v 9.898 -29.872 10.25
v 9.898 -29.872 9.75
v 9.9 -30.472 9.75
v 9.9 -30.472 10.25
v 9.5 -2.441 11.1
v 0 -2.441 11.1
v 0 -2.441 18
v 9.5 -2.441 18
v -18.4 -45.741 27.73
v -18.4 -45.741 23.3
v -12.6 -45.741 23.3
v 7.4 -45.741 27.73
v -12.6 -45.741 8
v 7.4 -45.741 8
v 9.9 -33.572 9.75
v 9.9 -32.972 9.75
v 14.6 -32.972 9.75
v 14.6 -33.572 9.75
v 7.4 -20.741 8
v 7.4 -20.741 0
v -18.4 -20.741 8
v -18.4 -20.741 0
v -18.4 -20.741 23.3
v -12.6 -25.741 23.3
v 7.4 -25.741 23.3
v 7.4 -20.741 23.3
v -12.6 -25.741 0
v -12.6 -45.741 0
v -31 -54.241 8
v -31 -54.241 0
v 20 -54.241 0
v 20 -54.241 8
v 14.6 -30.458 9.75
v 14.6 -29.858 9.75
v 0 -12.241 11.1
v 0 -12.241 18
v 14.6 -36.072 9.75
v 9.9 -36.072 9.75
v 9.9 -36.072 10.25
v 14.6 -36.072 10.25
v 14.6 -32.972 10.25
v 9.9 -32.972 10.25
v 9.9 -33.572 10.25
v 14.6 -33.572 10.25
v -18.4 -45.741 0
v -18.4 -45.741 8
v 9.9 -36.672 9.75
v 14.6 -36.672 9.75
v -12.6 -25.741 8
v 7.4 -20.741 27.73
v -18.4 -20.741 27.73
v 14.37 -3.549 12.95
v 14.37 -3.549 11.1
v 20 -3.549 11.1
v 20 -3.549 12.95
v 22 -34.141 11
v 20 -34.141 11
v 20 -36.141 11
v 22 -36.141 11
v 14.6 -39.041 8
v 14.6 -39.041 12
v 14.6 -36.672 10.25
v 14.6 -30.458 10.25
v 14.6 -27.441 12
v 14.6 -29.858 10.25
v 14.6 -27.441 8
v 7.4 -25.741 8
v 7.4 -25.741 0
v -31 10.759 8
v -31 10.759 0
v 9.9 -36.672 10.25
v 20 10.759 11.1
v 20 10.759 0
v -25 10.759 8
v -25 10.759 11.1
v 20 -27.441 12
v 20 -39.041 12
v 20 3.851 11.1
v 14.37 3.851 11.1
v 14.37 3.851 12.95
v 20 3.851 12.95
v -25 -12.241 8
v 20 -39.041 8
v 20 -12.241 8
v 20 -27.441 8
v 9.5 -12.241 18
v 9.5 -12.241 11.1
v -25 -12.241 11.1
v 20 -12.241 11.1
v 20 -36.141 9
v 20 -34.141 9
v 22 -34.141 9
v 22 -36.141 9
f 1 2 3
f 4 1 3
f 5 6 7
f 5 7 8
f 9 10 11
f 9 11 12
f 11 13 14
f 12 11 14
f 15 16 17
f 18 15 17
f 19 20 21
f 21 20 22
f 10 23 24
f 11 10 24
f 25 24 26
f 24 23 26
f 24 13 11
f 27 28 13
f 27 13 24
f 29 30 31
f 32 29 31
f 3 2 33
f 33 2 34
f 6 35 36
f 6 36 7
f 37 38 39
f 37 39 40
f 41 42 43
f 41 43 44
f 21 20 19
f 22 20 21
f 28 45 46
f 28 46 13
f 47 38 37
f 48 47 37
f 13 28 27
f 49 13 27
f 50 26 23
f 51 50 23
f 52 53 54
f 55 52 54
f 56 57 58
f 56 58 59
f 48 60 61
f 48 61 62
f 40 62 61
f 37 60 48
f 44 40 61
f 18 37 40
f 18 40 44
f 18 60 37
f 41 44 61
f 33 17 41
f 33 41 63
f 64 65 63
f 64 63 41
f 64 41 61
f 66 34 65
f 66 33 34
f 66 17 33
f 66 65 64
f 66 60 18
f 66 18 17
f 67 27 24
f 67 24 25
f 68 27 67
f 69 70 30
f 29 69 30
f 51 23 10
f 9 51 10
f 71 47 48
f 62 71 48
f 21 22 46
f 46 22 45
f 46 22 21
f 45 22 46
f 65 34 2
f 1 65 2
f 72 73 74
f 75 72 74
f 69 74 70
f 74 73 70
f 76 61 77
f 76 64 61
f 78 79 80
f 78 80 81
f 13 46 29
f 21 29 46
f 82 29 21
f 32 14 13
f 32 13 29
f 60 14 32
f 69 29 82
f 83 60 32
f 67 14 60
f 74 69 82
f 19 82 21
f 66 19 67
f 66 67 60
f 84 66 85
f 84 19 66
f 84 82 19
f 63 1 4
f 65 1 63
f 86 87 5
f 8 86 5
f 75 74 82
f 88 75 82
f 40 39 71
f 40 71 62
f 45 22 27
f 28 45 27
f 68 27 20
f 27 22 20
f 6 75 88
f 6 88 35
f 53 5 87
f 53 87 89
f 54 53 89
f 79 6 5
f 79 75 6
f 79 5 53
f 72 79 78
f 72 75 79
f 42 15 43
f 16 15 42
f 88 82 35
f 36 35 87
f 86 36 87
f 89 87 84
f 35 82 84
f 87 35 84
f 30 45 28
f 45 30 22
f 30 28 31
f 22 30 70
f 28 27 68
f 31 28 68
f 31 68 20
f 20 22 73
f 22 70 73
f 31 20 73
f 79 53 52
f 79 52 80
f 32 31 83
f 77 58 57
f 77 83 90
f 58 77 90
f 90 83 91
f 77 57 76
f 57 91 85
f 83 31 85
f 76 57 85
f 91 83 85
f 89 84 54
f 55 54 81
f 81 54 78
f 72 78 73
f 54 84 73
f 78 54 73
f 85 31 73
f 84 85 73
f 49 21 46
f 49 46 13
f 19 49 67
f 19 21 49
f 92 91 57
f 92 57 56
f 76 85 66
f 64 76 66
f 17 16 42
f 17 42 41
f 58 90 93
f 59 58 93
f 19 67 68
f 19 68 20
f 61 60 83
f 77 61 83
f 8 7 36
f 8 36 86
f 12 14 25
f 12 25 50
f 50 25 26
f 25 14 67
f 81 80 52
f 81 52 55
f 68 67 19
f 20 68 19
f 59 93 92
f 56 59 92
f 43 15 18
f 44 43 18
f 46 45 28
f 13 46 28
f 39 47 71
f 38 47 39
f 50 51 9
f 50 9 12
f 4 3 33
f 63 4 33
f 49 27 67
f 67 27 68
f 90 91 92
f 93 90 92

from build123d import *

# Parameters (mm, degrees)
F0_W      = 20
F0_H      = 20
F0_W_2    = 9.5
F0_H_2    = 9.8
F0_W_3    = 5.63
F0_H_3    = 7.4
F0_W_4    = 4.7
F0_H_4    = 0.6
F1_DEPTH  = 8
F2_DEPTH  = 11.1
F3_DEPTH  = 12.95
F4_DEPTH  = 18
F5_DEPTH  = 23.3
F6_DEPTH  = 27.73
F7_DEPTH  = 23.3
F8_DEPTH  = 8
F9_DEPTH  = 12
F10_DEPTH = 10.25
F11_DEPTH = 9.75
F12_DEPTH = 8
F0_W_5    = 2
F0_H_5    = 2
F13_DEPTH = 11
F14_DEPTH = 9


with BuildPart() as f1:
    # F0 (on Top) → F1 (new body)
    with BuildSketch(Plane.XY):
        Polygon((-25.000166, 10.759449), (-31.000166, 10.759449), (-31.000166, -54.240551), (19.999834, -54.240551), (19.999834, -39.040551), (14.599834, -39.040551), (14.599834, -36.671682), (9.899834, -36.671682), (9.899834, -36.071682), (14.599834, -36.071682), (14.599834, -33.571682), (9.899834, -33.571682), (9.899834, -32.971682), (14.599834, -32.971682), (14.599834, -30.457526), (9.899834, -30.471682), (9.898027, -29.871685), (14.599834, -29.857523), (14.599834, -27.440551), (19.999834, -27.440551), (19.999834, -12.240551), (9.5, -12.240551), (0, -12.240551), (-25.000166, -12.240551), align=None)
        Polygon((-12.6, -45.740551), (-18.4, -45.740551), (-18.4, -20.740551), (7.4, -20.740551), (7.4, -25.740551), (7.4, -45.740551), align=None, mode=Mode.SUBTRACT)
        with Locations((-2.6, -35.740551)):
            Rectangle(F0_W, F0_H)
        Polygon((-18.4, -20.740551), (-18.4, -45.740551), (-12.6, -45.740551), (-12.6, -25.740551), (7.4, -25.740551), (7.4, -20.740551), align=None)
        Polygon((19.999834, 10.759449), (-25.000166, 10.759449), (-25.000166, -12.240551), (0, -12.240551), (0, -2.440551), (9.5, -2.440551), (9.5, -12.240551), (19.999834, -12.240551), (19.999834, -3.548992), (14.369834, -3.548992), (14.369834, 3.851008), (19.999834, 3.851008), align=None)
        with Locations((4.75, -7.340551)):
            Rectangle(F0_W_2, F0_H_2)
        with Locations((17.184834, 0.151008)):
            Rectangle(F0_W_3, F0_H_3)
        Polygon((14.599834, -39.040551), (19.999834, -39.040551), (19.999834, -36.140551), (19.999834, -34.140551), (19.999834, -27.440551), (14.599834, -27.440551), (14.599834, -29.857523), (14.599834, -30.457526), (14.599834, -32.971682), (14.599834, -33.571682), (14.599834, -36.071682), (14.599834, -36.671682), align=None)
        with Locations((12.249834, -36.371682)):
            Rectangle(F0_W_4, F0_H_4)
        with Locations((12.249834, -33.271682)):
            Rectangle(F0_W_4, F0_H_4)
        Polygon((14.599834, -30.457526), (14.599834, -29.857523), (9.898027, -29.871685), (9.899834, -30.471682), align=None)
    extrude(amount=F1_DEPTH)

    # F0 (on Top) → F2 (join)
    with BuildSketch(Plane.XY):
        Polygon((19.999834, 10.759449), (-25.000166, 10.759449), (-25.000166, -12.240551), (0, -12.240551), (0, -2.440551), (9.5, -2.440551), (9.5, -12.240551), (19.999834, -12.240551), (19.999834, -3.548992), (14.369834, -3.548992), (14.369834, 3.851008), (19.999834, 3.851008), align=None)
        with Locations((4.75, -7.340551)):
            Rectangle(F0_W_2, F0_H_2)
        with Locations((17.184834, 0.151008)):
            Rectangle(F0_W_3, F0_H_3)
    extrude(amount=F2_DEPTH)

    # F0 (on Top) → F3 (join)
    with BuildSketch(Plane.XY):
        with Locations((17.184834, 0.151008)):
            Rectangle(F0_W_3, F0_H_3)
    extrude(amount=F3_DEPTH)

    # F0 (on Top) → F4 (join)
    with BuildSketch(Plane.XY):
        with Locations((4.75, -7.340551)):
            Rectangle(F0_W_2, F0_H_2)
    extrude(amount=F4_DEPTH)

    # F0 (on Top) → F5 (join)
    with BuildSketch(Plane.XY):
        with Locations((-2.6, -35.740551)):
            Rectangle(F0_W, F0_H)
    extrude(amount=F5_DEPTH)

    # F0 (on Top) → F6 (join)
    with BuildSketch(Plane.XY):
        with Locations((-2.6, -35.740551)):
            Rectangle(F0_W, F0_H)
        Polygon((-18.4, -20.740551), (-18.4, -45.740551), (-12.6, -45.740551), (-12.6, -25.740551), (7.4, -25.740551), (7.4, -20.740551), align=None)
    extrude(amount=F6_DEPTH)

    # F0 (on Top) → F7 (cut)
    with BuildSketch(Plane.XY):
        Polygon((-18.4, -20.740551), (-18.4, -45.740551), (-12.6, -45.740551), (-12.6, -25.740551), (7.4, -25.740551), (7.4, -20.740551), align=None)
    extrude(amount=F7_DEPTH, mode=Mode.SUBTRACT)

    # F0 (on Top) → F9 (join)
    with BuildSketch(Plane.XY):
        Polygon((14.599834, -39.040551), (19.999834, -39.040551), (19.999834, -36.140551), (19.999834, -34.140551), (19.999834, -27.440551), (14.599834, -27.440551), (14.599834, -29.857523), (14.599834, -30.457526), (14.599834, -32.971682), (14.599834, -33.571682), (14.599834, -36.071682), (14.599834, -36.671682), align=None)
    extrude(amount=F9_DEPTH)

    # F0 (on Top) → F10 (join)
    with BuildSketch(Plane.XY):
        Polygon((14.599834, -30.457526), (14.599834, -29.857523), (9.898027, -29.871685), (9.899834, -30.471682), align=None)
        with Locations((12.249834, -33.271682)):
            Rectangle(F0_W_4, F0_H_4)
        with Locations((12.249834, -36.371682)):
            Rectangle(F0_W_4, F0_H_4)
    extrude(amount=F10_DEPTH)

    # F0 (on Top) → F11 (cut)
    with BuildSketch(Plane.XY):
        Polygon((14.599834, -30.457526), (14.599834, -29.857523), (9.898027, -29.871685), (9.899834, -30.471682), align=None)
        with Locations((12.249834, -33.271682)):
            Rectangle(F0_W_4, F0_H_4)
        with Locations((12.249834, -36.371682)):
            Rectangle(F0_W_4, F0_H_4)
    extrude(amount=F11_DEPTH, mode=Mode.SUBTRACT)

    # F0 (on Top) → F12 (join)
    with BuildSketch(Plane.XY):
        with Locations((12.249834, -36.371682)):
            Rectangle(F0_W_4, F0_H_4)
        with Locations((12.249834, -33.271682)):
            Rectangle(F0_W_4, F0_H_4)
        Polygon((14.599834, -30.457526), (14.599834, -29.857523), (9.898027, -29.871685), (9.899834, -30.471682), align=None)
    extrude(amount=F12_DEPTH)

    # F0 (on Top) → F13 (join)
    with BuildSketch(Plane.XY):
        with Locations((20.999834, -35.140551)):
            Rectangle(F0_W_5, F0_H_5)
    extrude(amount=F13_DEPTH)

    # F0 (on Top) → F14 (cut)
    with BuildSketch(Plane.XY):
        with Locations((20.999834, -35.140551)):
            Rectangle(F0_W_5, F0_H_5)
    extrude(amount=F14_DEPTH, mode=Mode.SUBTRACT)


with BuildPart() as f8:
    # F0 (on Top) → F8 (new body)
    with BuildSketch(Plane.XY):
        Polygon((-18.4, -20.740551), (-18.4, -45.740551), (-12.6, -45.740551), (-12.6, -25.740551), (7.4, -25.740551), (7.4, -20.740551), align=None)
    extrude(amount=F8_DEPTH)


solid = Compound([f1.part, f8.part])
